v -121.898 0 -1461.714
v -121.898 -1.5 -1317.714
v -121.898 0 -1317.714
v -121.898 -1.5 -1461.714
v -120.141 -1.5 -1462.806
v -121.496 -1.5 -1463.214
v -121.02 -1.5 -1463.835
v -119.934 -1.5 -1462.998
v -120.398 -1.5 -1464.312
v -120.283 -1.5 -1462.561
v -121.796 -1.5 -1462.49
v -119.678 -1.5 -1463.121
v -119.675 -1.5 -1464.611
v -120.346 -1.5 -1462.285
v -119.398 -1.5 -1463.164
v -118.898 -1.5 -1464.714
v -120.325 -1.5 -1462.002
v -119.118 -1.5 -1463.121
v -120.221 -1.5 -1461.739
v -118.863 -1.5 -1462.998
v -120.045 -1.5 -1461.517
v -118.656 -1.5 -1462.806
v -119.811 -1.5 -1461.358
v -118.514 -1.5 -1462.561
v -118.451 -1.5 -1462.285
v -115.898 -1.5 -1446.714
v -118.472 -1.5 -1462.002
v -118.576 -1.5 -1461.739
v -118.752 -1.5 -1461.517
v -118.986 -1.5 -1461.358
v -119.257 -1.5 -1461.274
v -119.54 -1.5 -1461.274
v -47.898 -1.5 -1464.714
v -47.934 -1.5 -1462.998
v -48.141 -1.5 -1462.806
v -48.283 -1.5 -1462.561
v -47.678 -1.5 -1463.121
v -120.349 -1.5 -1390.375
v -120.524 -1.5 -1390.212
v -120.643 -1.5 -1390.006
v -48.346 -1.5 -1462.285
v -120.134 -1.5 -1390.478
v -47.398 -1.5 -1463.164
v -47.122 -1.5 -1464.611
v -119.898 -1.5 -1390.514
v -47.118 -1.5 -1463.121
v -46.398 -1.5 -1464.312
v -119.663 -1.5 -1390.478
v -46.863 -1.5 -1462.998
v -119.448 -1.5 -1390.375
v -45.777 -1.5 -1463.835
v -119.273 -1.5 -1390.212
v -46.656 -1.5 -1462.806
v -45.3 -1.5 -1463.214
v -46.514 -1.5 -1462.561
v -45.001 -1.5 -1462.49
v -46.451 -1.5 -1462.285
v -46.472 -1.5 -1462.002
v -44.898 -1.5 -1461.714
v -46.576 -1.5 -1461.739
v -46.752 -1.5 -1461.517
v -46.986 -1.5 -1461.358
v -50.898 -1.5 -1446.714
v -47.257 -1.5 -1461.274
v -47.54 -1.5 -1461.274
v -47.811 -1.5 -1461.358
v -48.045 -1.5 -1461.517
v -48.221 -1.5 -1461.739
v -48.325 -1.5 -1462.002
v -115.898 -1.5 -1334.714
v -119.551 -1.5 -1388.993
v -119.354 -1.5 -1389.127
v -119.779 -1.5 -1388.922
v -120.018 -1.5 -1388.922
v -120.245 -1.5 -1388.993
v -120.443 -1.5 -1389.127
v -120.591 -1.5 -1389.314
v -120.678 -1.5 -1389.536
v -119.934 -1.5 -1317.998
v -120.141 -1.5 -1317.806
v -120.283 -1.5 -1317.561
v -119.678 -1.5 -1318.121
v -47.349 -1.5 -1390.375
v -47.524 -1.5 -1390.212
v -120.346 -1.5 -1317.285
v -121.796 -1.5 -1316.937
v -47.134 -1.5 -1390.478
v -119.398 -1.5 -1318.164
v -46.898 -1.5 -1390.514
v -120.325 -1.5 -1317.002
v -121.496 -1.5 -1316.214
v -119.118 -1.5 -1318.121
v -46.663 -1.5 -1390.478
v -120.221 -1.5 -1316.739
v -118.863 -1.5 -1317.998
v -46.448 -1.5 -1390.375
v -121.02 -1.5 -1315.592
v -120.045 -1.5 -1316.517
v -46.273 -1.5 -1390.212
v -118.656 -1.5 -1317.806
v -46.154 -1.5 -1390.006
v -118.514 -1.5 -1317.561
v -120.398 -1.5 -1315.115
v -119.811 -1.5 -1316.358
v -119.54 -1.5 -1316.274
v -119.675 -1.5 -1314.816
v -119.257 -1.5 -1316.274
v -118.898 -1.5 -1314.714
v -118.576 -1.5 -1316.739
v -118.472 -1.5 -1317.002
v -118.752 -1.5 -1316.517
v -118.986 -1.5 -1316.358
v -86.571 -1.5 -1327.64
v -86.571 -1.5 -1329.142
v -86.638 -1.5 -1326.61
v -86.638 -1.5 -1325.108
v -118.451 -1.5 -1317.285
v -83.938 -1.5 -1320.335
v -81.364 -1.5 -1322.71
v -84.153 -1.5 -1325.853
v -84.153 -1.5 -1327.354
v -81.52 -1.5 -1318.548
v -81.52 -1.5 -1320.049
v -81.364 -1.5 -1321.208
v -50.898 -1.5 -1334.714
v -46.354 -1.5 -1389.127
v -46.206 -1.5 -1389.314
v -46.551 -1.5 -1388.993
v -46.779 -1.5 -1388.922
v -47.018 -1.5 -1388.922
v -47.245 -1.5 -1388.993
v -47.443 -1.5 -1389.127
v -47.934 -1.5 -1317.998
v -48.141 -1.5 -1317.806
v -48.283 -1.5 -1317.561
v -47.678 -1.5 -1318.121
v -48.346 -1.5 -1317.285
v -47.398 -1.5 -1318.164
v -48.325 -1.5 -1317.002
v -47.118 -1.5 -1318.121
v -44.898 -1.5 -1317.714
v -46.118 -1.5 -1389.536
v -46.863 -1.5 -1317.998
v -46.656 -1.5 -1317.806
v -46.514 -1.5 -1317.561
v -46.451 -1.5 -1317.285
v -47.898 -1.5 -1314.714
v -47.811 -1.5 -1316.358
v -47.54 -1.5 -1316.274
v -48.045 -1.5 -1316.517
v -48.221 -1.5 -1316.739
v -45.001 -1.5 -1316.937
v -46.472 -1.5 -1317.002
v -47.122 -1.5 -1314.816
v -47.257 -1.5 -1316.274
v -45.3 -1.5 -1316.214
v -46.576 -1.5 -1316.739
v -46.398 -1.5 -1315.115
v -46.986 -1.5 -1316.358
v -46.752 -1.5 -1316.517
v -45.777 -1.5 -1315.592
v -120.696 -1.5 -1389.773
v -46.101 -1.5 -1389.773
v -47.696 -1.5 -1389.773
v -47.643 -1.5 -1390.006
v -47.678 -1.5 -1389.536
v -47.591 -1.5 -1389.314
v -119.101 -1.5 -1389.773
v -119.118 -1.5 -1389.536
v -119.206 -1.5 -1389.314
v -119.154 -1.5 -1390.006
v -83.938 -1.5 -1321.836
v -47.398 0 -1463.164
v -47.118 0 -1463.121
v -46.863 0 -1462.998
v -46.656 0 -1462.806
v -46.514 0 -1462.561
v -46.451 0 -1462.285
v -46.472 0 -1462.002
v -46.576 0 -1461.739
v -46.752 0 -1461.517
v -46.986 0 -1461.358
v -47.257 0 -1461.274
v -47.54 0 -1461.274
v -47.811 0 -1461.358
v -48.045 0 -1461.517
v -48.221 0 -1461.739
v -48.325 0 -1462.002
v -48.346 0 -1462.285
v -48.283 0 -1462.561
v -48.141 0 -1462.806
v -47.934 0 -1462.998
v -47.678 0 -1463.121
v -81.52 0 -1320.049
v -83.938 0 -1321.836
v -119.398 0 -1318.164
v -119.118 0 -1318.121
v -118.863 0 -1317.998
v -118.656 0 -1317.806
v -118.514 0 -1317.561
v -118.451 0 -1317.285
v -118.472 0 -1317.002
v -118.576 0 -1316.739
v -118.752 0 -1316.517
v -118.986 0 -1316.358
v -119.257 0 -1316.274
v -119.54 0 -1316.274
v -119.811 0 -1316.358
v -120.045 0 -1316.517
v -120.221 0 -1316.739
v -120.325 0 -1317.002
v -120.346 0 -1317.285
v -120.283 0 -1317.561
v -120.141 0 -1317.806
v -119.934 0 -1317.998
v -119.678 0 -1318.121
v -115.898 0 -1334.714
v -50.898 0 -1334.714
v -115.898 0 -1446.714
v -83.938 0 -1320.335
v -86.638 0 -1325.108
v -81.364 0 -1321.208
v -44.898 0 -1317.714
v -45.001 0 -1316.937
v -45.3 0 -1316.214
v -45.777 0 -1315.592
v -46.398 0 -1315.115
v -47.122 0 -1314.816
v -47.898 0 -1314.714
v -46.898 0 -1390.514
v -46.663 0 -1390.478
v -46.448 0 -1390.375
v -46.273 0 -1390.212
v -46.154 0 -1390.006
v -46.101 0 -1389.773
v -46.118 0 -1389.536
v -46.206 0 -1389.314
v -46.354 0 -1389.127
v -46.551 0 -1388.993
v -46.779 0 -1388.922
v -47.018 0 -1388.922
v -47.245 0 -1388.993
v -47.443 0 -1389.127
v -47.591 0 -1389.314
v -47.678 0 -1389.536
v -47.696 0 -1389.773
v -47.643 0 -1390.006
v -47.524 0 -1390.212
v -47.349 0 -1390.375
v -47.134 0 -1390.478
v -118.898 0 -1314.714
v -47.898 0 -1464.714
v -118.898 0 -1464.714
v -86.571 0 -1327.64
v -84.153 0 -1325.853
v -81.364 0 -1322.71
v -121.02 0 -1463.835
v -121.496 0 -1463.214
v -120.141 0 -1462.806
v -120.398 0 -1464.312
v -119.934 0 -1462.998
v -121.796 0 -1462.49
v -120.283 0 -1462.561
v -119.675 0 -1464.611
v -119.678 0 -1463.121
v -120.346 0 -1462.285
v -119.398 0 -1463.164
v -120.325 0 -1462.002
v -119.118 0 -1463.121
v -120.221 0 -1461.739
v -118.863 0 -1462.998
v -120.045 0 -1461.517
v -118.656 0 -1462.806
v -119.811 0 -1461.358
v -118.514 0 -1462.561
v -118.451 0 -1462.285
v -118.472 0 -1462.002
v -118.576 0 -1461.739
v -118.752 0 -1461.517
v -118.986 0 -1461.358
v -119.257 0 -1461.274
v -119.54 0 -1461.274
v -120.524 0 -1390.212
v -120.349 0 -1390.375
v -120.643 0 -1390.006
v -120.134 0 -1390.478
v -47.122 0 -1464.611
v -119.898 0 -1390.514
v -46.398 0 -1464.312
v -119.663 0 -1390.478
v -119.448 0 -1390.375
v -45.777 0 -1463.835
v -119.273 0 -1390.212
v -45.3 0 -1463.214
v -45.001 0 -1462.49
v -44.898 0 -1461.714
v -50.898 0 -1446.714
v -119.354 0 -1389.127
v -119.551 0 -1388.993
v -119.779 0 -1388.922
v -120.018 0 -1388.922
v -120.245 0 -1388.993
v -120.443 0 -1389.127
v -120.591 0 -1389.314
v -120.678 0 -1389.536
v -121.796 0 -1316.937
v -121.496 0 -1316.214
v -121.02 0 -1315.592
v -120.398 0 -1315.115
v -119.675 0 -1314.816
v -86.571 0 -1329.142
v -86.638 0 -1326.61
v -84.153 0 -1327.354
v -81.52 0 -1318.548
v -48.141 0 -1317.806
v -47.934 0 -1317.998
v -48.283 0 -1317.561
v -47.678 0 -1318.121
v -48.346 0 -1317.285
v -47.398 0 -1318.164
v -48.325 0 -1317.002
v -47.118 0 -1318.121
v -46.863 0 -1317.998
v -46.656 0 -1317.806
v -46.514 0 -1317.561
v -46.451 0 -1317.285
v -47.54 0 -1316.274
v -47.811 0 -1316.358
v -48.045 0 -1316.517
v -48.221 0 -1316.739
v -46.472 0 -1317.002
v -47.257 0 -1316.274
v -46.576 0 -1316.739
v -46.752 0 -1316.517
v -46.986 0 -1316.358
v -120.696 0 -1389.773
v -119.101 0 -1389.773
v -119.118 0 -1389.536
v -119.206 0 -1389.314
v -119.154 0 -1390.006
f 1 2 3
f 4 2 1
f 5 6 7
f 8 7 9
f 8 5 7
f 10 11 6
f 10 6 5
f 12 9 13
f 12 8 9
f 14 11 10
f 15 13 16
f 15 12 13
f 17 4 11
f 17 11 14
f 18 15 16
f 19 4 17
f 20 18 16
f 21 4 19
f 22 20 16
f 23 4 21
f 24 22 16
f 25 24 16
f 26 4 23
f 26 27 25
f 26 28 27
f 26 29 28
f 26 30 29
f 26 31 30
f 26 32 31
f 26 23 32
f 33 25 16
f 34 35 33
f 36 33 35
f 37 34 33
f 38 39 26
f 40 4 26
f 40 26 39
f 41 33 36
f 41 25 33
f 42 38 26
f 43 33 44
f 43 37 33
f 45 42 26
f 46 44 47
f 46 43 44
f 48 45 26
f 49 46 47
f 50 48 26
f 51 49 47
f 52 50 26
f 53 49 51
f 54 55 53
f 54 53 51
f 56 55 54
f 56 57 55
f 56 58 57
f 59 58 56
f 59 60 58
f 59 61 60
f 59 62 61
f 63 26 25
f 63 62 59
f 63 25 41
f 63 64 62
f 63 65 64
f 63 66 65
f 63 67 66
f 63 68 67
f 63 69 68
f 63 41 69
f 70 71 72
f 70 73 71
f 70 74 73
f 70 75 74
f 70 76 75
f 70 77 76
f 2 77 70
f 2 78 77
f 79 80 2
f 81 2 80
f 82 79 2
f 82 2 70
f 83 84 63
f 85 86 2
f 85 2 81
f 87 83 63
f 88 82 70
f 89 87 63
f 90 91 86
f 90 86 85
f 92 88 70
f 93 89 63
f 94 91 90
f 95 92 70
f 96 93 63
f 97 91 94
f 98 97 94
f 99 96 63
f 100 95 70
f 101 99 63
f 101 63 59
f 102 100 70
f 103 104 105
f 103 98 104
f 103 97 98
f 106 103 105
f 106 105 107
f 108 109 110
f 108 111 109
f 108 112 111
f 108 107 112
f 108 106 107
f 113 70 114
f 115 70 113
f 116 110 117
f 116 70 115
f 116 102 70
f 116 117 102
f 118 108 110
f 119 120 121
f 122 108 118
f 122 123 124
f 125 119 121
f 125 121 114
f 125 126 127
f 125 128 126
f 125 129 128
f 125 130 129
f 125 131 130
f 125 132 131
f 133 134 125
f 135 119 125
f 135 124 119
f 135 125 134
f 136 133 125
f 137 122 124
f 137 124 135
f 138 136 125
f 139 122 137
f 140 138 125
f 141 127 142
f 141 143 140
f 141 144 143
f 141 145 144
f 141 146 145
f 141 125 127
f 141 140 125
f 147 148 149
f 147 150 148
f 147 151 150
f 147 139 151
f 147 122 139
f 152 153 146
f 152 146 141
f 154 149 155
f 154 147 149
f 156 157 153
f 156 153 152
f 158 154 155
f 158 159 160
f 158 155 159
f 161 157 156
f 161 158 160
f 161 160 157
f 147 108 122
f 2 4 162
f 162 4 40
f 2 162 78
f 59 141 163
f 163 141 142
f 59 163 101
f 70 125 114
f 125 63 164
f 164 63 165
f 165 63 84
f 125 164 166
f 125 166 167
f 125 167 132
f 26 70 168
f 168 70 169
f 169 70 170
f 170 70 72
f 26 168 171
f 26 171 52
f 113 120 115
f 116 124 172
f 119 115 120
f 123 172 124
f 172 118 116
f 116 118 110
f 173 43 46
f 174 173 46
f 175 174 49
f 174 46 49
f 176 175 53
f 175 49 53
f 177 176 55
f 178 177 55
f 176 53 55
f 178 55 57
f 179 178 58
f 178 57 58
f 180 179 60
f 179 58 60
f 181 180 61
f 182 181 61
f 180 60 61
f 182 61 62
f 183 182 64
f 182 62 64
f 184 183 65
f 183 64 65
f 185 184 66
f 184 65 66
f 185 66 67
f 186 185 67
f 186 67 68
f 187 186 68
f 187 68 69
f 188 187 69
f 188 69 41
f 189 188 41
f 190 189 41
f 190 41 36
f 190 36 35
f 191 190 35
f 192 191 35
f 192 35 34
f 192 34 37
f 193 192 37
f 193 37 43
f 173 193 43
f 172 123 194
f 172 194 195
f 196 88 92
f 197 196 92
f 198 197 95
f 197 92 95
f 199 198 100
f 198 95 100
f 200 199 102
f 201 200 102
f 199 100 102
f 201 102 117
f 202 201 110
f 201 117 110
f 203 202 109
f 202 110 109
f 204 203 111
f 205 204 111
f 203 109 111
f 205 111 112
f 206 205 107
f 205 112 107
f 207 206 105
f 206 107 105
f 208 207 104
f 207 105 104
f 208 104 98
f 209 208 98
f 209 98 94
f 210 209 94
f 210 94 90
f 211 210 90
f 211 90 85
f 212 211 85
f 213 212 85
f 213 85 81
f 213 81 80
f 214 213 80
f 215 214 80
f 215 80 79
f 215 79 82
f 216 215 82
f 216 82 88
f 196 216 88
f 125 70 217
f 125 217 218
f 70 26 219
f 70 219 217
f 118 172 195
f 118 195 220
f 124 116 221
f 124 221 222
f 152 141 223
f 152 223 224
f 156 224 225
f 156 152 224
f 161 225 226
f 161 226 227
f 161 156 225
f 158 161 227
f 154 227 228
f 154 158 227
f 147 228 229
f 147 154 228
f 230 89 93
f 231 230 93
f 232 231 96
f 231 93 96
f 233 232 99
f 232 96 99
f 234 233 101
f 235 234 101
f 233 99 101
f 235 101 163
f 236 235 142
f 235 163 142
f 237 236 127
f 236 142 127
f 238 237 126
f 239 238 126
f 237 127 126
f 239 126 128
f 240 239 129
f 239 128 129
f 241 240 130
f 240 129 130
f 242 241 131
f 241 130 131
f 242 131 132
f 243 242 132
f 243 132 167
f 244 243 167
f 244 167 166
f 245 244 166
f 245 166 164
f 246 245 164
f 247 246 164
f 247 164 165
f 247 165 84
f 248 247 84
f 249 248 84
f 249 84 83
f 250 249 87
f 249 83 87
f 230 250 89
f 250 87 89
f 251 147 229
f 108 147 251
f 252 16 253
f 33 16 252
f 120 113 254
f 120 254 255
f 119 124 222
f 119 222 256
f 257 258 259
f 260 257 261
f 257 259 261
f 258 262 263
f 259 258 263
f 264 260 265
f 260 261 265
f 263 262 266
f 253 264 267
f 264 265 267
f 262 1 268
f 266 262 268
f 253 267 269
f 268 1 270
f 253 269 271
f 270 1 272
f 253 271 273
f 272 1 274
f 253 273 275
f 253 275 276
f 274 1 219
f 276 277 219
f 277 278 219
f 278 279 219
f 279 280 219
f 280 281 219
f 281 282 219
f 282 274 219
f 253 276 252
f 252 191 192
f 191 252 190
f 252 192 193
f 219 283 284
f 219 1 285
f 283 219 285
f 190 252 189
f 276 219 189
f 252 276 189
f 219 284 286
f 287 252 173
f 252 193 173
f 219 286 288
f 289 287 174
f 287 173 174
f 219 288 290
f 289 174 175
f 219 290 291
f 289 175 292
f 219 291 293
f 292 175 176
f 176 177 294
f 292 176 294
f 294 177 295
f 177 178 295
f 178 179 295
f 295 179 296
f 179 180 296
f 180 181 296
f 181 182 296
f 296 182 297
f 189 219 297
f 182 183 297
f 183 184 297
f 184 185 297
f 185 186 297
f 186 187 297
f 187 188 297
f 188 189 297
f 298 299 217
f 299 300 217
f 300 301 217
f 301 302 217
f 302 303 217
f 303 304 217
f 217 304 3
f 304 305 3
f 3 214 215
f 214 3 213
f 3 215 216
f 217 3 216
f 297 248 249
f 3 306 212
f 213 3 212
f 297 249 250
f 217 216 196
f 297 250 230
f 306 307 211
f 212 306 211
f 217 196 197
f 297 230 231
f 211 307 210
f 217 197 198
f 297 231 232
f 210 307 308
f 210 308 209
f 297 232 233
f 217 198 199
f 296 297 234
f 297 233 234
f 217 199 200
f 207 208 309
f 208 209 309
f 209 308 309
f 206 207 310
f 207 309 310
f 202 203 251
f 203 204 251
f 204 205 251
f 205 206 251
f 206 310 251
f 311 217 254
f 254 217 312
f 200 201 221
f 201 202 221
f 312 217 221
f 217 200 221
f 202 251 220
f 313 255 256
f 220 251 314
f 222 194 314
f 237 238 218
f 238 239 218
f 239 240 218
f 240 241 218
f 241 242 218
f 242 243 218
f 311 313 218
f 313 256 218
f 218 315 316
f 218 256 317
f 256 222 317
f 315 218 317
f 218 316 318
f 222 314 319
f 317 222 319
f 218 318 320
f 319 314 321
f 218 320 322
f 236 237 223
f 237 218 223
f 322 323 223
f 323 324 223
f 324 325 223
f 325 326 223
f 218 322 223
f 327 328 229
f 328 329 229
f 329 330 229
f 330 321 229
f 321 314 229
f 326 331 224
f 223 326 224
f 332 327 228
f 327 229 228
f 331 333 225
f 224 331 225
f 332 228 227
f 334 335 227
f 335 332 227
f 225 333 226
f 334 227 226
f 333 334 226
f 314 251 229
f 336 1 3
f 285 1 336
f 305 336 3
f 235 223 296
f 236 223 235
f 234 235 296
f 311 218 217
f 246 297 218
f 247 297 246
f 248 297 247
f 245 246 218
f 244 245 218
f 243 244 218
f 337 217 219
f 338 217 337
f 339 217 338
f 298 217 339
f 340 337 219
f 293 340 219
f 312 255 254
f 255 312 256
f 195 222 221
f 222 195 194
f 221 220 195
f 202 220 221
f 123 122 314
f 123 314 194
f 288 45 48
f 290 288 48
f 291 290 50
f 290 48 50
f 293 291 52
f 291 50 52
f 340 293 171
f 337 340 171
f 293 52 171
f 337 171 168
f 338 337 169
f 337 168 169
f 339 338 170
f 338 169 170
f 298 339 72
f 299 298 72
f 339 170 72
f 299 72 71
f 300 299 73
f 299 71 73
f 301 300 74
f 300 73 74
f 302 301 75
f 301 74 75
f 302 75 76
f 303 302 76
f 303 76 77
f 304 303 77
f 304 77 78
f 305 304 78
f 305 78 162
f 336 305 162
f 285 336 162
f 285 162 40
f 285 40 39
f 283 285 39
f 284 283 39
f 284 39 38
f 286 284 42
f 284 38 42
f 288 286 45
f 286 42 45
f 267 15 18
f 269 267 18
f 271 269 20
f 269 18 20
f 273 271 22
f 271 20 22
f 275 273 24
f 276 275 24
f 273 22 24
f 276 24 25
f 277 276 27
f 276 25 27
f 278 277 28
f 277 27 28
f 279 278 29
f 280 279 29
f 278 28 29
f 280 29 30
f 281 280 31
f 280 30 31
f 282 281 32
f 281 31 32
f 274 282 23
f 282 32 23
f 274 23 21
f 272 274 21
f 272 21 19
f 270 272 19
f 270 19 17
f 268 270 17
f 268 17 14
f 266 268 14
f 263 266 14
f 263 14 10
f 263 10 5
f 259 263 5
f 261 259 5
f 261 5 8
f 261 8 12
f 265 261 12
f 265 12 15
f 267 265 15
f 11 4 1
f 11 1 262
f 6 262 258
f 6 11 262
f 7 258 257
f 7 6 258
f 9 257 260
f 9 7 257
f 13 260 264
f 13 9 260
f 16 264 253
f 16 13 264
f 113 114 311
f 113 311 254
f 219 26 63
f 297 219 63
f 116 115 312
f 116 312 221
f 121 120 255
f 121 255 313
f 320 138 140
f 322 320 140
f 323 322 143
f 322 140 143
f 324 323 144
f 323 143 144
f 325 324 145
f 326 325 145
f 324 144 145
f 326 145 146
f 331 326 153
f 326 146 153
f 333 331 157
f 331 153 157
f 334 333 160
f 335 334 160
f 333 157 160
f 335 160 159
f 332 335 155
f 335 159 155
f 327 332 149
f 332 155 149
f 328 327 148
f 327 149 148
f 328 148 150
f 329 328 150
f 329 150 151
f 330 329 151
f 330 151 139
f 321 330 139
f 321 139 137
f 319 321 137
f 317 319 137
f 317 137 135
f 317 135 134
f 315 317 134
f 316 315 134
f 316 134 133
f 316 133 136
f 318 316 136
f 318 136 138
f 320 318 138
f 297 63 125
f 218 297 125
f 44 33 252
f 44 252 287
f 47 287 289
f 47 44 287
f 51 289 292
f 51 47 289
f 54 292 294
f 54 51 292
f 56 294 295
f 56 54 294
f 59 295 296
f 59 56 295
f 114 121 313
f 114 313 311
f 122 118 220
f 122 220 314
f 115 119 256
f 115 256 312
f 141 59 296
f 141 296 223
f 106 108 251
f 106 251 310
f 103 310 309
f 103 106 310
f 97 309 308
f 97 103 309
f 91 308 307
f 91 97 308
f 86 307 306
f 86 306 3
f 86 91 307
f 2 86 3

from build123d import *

# Parameters (mm, degrees)
EXTRUDE_1_DEPTH     = 15
FILLET_1_R          = 1
EXTRUDE_START       = -2
SKETCH_2_R          = 1.5
EXTRUDE_2_DEPTH     = 2
FILLET_7_R          = 1
FILLET_2_R          = 1
FILLET_3_R          = 1
FILLET_4_R          = 1
SKETCH_3_R          = 0.95
CUT_EXTRUDE_1_DEPTH = 10
EXTRUDE_3_DEPTH     = 3
FILLET_6_R          = 1
SKETCH_5_R          = 1
CUT_EXTRUDE_2_DEPTH = 2
EXTRUDE_START_2     = 1.5
SKETCH_6_R          = 0.95
EXTRUDE_4_DEPTH     = 1.5
SKETCH_7_W          = 91.570704936
SKETCH_7_H          = 168.371941333
CUT_EXTRUDE_3_DEPTH = 15
SKETCH_8_W          = 65
SKETCH_8_H          = 116
CUT_EXTRUDE_4_DEPTH = 1.5
CUT_EXTRUDE_5_DEPTH = 1.5
SKETCH_10_W         = 65
SKETCH_10_H         = 2
EXTRUDE_5_DEPTH     = 1.5
SKETCH_11_R         = 0.8
CUT_EXTRUDE_6_DEPTH = 1.5


with BuildPart() as part:
    # 草图1 → 凸台-拉伸1 (new body)
    with BuildSketch(Plane(origin=(0.249036734, 0, -75.707167104), x_dir=(1, 0, 0), z_dir=(0, 1, 0))):
        with BuildLine():
            Line((-45.147424513, 1386.006364089), (-45.147424513, 1242.006364089))
            ThreePointArc((-45.147424513, 1242.006364089), (-46.02610417, 1239.885043746), (-48.147424513, 1239.006364089))
            Line((-48.147424513, 1239.006364089), (-119.147424513, 1239.006364089))
            ThreePointArc((-119.147424513, 1239.006364089), (-121.268744857, 1239.885043746), (-122.147424513, 1242.006364089))
            Line((-122.147424513, 1242.006364089), (-122.147424513, 1386.006364089))
            ThreePointArc((-122.147424513, 1386.006364089), (-121.268744857, 1388.127684433), (-119.147424513, 1389.006364089))
            Line((-119.147424513, 1389.006364089), (-48.147424513, 1389.006364089))
            ThreePointArc((-48.147424513, 1389.006364089), (-46.02610417, 1388.127684433), (-45.147424513, 1386.006364089))
        make_face()
        with BuildLine():
            Line((-110.647424513, 1387.506364089), (-86.803457574, 1387.506364089))
            Line((-86.803457574, 1387.506364089), (-86.803457574, 1384.506364089))
            Line((-86.803457574, 1384.506364089), (-79.369983761, 1384.506364089))
            Line((-79.369983761, 1384.506364089), (-79.369983761, 1387.506364089))
            Line((-79.369983761, 1387.506364089), (-56.647424513, 1387.506364089))
            ThreePointArc((-56.647424513, 1387.506364089), (-49.576356701, 1384.577431901), (-46.647424513, 1377.506364089))
            Line((-46.647424513, 1377.506364089), (-46.647424513, 1369.006364089))
            Line((-46.647424513, 1369.006364089), (-49.044172281, 1369.006364089))
            Line((-49.044172281, 1369.006364089), (-49.044172281, 1366.006364089))
            Line((-49.044172281, 1366.006364089), (-46.647424513, 1366.006364089))
            Line((-46.647424513, 1366.006364089), (-46.647424513, 1262.006364089))
            Line((-46.647424513, 1262.006364089), (-49.044172281, 1262.006364089))
            Line((-49.044172281, 1262.006364089), (-49.044172281, 1259.006364089))
            Line((-49.044172281, 1259.006364089), (-46.647424513, 1259.006364089))
            Line((-46.647424513, 1259.006364089), (-46.647424513, 1250.506364089))
            ThreePointArc((-46.647424513, 1250.506364089), (-49.576356701, 1243.435296277), (-56.647424513, 1240.506364089))
            Line((-56.647424513, 1240.506364089), (-80.788236334, 1240.506364089))
            Line((-80.788236334, 1240.506364089), (-80.788236334, 1243.506364089))
            Line((-80.788236334, 1243.506364089), (-86.803457574, 1243.506364089))
            Line((-86.803457574, 1243.506364089), (-86.803457574, 1240.506364089))
            Line((-86.803457574, 1240.506364089), (-110.647424513, 1240.506364089))
            ThreePointArc((-110.647424513, 1240.506364089), (-117.718492325, 1243.435296277), (-120.647424513, 1250.506364089))
            Line((-120.647424513, 1250.506364089), (-120.647424513, 1259.006364089))
            Line((-120.647424513, 1259.006364089), (-118.250676745, 1259.006364089))
            Line((-118.250676745, 1259.006364089), (-118.250676745, 1262.006364089))
            Line((-118.250676745, 1262.006364089), (-120.647424513, 1262.006364089))
            Line((-120.647424513, 1262.006364089), (-120.647424513, 1366.006364089))
            Line((-120.647424513, 1366.006364089), (-118.250676745, 1366.006364089))
            Line((-118.250676745, 1366.006364089), (-118.250676745, 1369.006364089))
            Line((-118.250676745, 1369.006364089), (-120.647424513, 1369.006364089))
            Line((-120.647424513, 1369.006364089), (-120.647424513, 1377.506364089))
            ThreePointArc((-120.647424513, 1377.506364089), (-117.718492325, 1384.577431901), (-110.647424513, 1387.506364089))
        make_face(mode=Mode.SUBTRACT)
    extrude(amount=EXTRUDE_1_DEPTH)

    # 圆角1
    fillet_1_edges = [part.edges().sort_by_distance(p)[0] for p in [
        (-48.795135547, 7.5, -1334.713531194),
        (-48.795135547, 7.5, -1337.713531194),
        (-48.795135547, 7.5, -1441.713531194),
        (-48.795135547, 7.5, -1444.713531194),
        (-79.120947027, 7.5, -1460.213531194),
        (-86.55442084, 7.5, -1460.213531194),
        (-118.001640012, 7.5, -1444.713531194),
        (-118.001640012, 7.5, -1441.713531194),
        (-118.001640012, 7.5, -1337.713531194),
        (-118.001640012, 7.5, -1334.713531194),
        (-86.55442084, 7.5, -1319.213531194),
        (-80.5391996, 7.5, -1319.213531194),
    ]]
    fillet(fillet_1_edges, radius=FILLET_1_R)

    # 草图2 → 凸台-拉伸2 (add)
    with BuildSketch(Plane(origin=(0.249036734, 15, -75.707167104), x_dir=(1, 0, 0), z_dir=(0, 1, 0)).offset(EXTRUDE_START)):
        with BuildLine():
            Line((-45.147424513, 1242.006364089), (-45.147424513, 1386.006364089))
            ThreePointArc((-45.147424513, 1386.006364089), (-46.02610417, 1388.127684433), (-48.147424513, 1389.006364089))
            Line((-48.147424513, 1389.006364089), (-119.147424513, 1389.006364089))
            ThreePointArc((-119.147424513, 1389.006364089), (-121.268744857, 1388.127684433), (-122.147424513, 1386.006364089))
            Line((-122.147424513, 1386.006364089), (-122.147424513, 1242.006364089))
            ThreePointArc((-122.147424513, 1242.006364089), (-121.268744857, 1239.885043746), (-119.147424513, 1239.006364089))
            Line((-119.147424513, 1239.006364089), (-48.147424513, 1239.006364089))
            ThreePointArc((-48.147424513, 1239.006364089), (-46.02610417, 1239.885043746), (-45.147424513, 1242.006364089))
        make_face()
        with Locations(Location((-84.647424513, 1378.506364089, 0), (0, 0, 270))):
            Circle(SKETCH_2_R, mode=Mode.SUBTRACT)
        with Locations(Location((-84.647424513, 1328.506364089, 0), (0, 0, 270))):
            Circle(SKETCH_2_R, mode=Mode.SUBTRACT)
        with BuildLine():
            Line((-65.147424513, 1308.756575121), (-65.147424513, 1318.506364089))
            ThreePointArc((-65.147424513, 1318.506364089), (-65.440317732, 1319.21347087), (-66.147424513, 1319.506364089))
            Line((-66.147424513, 1319.506364089), (-92.147424513, 1319.506364089))
            ThreePointArc((-92.147424513, 1319.506364089), (-92.854531294, 1319.21347087), (-93.147424513, 1318.506364089))
            Line((-93.147424513, 1318.506364089), (-93.147424513, 1313.006364089))
            ThreePointArc((-93.147424513, 1313.006364089), (-93.440317732, 1312.299257308), (-94.147424513, 1312.006364089))
            Line((-94.147424513, 1312.006364089), (-95.147424513, 1312.006364089))
            ThreePointArc((-95.147424513, 1312.006364089), (-95.854531294, 1311.71347087), (-96.147424513, 1311.006364089))
            Line((-96.147424513, 1311.006364089), (-96.147424513, 1305.006364089))
            ThreePointArc((-96.147424513, 1305.006364089), (-95.854531294, 1304.299257308), (-95.147424513, 1304.006364089))
            Line((-95.147424513, 1304.006364089), (-86.147424513, 1304.006364089))
            ThreePointArc((-86.147424513, 1304.006364089), (-85.440317732, 1303.71347087), (-85.147424513, 1303.006364089))
            Line((-85.147424513, 1303.006364089), (-85.147424513, 1274.006364089))
            ThreePointArc((-85.147424513, 1274.006364089), (-84.854531294, 1273.299257308), (-84.147424513, 1273.006364089))
            Line((-84.147424513, 1273.006364089), (-65.147424513, 1273.006364089))
            Line((-65.147424513, 1273.006364089), (-64.147424513, 1273.006364089))
            Line((-64.147424513, 1273.006364089), (-64.147424513, 1269.756575121))
            ThreePointArc((-64.147424513, 1269.756575121), (-63.854531294, 1269.04946834), (-63.147424513, 1268.756575121))
            Line((-63.147424513, 1268.756575121), (-56.817685319, 1268.756575121))
            ThreePointArc((-56.817685319, 1268.756575121), (-56.110578538, 1269.04946834), (-55.817685319, 1269.756575121))
            Line((-55.817685319, 1269.756575121), (-55.817685319, 1308.756575121))
            Line((-55.817685319, 1308.756575121), (-65.147424513, 1308.756575121))
        make_face(mode=Mode.SUBTRACT)
        with BuildLine():
            Line((-89.147424513, 1277.506364089), (-99.147424513, 1277.506364089))
            ThreePointArc((-99.147424513, 1277.506364089), (-99.854531294, 1277.799257308), (-100.147424513, 1278.506364089))
            Line((-100.147424513, 1278.506364089), (-100.147424513, 1283.506364089))
            ThreePointArc((-100.147424513, 1283.506364089), (-99.854531294, 1284.21347087), (-99.147424513, 1284.506364089))
            Line((-99.147424513, 1284.506364089), (-89.147424513, 1284.506364089))
            ThreePointArc((-89.147424513, 1284.506364089), (-88.440317732, 1284.21347087), (-88.147424513, 1283.506364089))
            Line((-88.147424513, 1283.506364089), (-88.147424513, 1278.506364089))
            ThreePointArc((-88.147424513, 1278.506364089), (-88.440317732, 1277.799257308), (-89.147424513, 1277.506364089))
        make_face(mode=Mode.SUBTRACT)
        with BuildLine():
            Line((-104.147424513, 1374.006364089), (-65.147424513, 1374.006364089))
            ThreePointArc((-65.147424513, 1374.006364089), (-64.440317732, 1373.71347087), (-64.147424513, 1373.006364089))
            Line((-64.147424513, 1373.006364089), (-64.147424513, 1334.006364089))
            ThreePointArc((-64.147424513, 1334.006364089), (-64.440317732, 1333.299257308), (-65.147424513, 1333.006364089))
            Line((-65.147424513, 1333.006364089), (-104.147424513, 1333.006364089))
            ThreePointArc((-104.147424513, 1333.006364089), (-104.854531294, 1333.299257308), (-105.147424513, 1334.006364089))
            Line((-105.147424513, 1334.006364089), (-105.147424513, 1373.006364089))
            ThreePointArc((-105.147424513, 1373.006364089), (-104.854531294, 1373.71347087), (-104.147424513, 1374.006364089))
        make_face(mode=Mode.SUBTRACT)
    extrude(amount=EXTRUDE_2_DEPTH)

    # 圆角7
    fillet_7_edges = [part.edges().sort_by_distance(p)[0] for p in [
        (-63.898387779, 14, -1348.713531194),
        (-64.898387779, 14, -1384.463742225),
        (-55.568648585, 14, -1384.463742225),
    ]]
    fillet(fillet_7_edges, radius=FILLET_7_R)

    # 圆角2
    fillet_2_edges = [part.edges().sort_by_distance(p)[0] for p in [
        (-78.898387779, 15, -1395.213531194),
        (-92.60549456, 15, -1394.920637975),
        (-92.898387779, 15, -1391.463531194),
        (-93.191280998, 15, -1388.006424412),
        (-94.398387779, 15, -1387.713531194),
        (-95.60549456, 15, -1387.420637975),
        (-95.898387779, 15, -1383.713531194),
        (-95.60549456, 15, -1380.006424412),
        (-90.398387779, 15, -1379.713531194),
        (-85.191280998, 15, -1379.420637975),
        (-84.898387779, 15, -1364.213531194),
        (-84.60549456, 15, -1349.006424412),
        (-74.398387779, 15, -1348.713531194),
        (-64.898387779, 15, -1389.838636709),
        (-65.191280998, 15, -1394.920637975),
        (-93.898387779, 15, -1360.213531194),
        (-99.60549456, 15, -1359.920637975),
        (-99.898387779, 15, -1356.713531194),
        (-99.60549456, 15, -1353.506424412),
        (-93.898387779, 15, -1353.213531194),
        (-88.191280998, 15, -1353.506424412),
        (-87.898387779, 15, -1356.713531194),
        (-88.191280998, 15, -1359.920637975),
        (-83.398387779, 15, -1314.713531194),
        (-121.019708123, 15, -1315.59221085),
        (-121.898387779, 15, -1389.713531194),
        (-121.019708123, 15, -1463.834851537),
        (-83.398387779, 15, -1464.713531194),
        (-45.777067436, 15, -1463.834851537),
        (-44.898387779, 15, -1389.713531194),
        (-45.777067436, 15, -1315.59221085),
        (-63.898387779, 15, -1429.213531194),
        (-64.191280998, 15, -1449.420637975),
        (-84.398387779, 15, -1449.713531194),
        (-104.60549456, 15, -1449.420637975),
        (-104.898387779, 15, -1429.213531194),
        (-104.60549456, 15, -1409.006424412),
        (-84.398387779, 15, -1408.713531194),
        (-64.191280998, 15, -1409.006424412),
        (-84.398387779, 15, -1455.713531194),
        (-84.398387779, 15, -1405.713531194),
        (-59.733518182, 15, -1344.463742225),
        (-55.861541804, 15, -1344.756635444),
        (-55.568648585, 15, -1364.463742225),
        (-60.233518182, 15, -1384.463742225),
        (-63.898387779, 15, -1346.588636709),
        (-63.60549456, 15, -1344.756635444),
        (-55.861541804, 15, -1384.170849006),
        (-64.60549456, 15, -1384.756635444),
        (-64.191280998, 15, -1348.420637975),
    ]]
    fillet(fillet_2_edges, radius=FILLET_2_R)

    # 圆角3
    fillet_3_edges = [part.edges().sort_by_distance(p)[0] for p in [
        (-48.795135547, 0, -1336.213531194),
        (-47.096761663, 0, -1337.713531194),
        (-48.795135547, 0, -1443.213531194),
        (-47.096761663, 0, -1444.713531194),
        (-82.837683934, 0, -1460.213531194),
        (-86.55442084, 0, -1462.213531194),
        (-118.001640012, 0, -1443.213531194),
        (-119.700013895, 0, -1441.713531194),
        (-118.001640012, 0, -1336.213531194),
        (-119.700013895, 0, -1334.713531194),
        (-118.29453323, 0, -1444.420637975),
        (-118.29453323, 0, -1442.006424412),
        (-48.502242328, 0, -1444.420637975),
        (-48.502242328, 0, -1442.006424412),
        (-48.502242328, 0, -1337.420637975),
        (-48.502242328, 0, -1335.006424412),
        (-118.29453323, 0, -1337.420637975),
        (-118.29453323, 0, -1335.006424412),
        (-86.261527622, 0, -1460.506424412),
        (-79.413840246, 0, -1460.506424412),
        (-47.096761663, 0, -1334.713531194),
        (-47.096761663, 0, -1441.713531194),
        (-79.120947027, 0, -1462.213531194),
        (-119.700013895, 0, -1444.713531194),
        (-119.700013895, 0, -1337.713531194),
    ]]
    fillet(fillet_3_edges, radius=FILLET_3_R)

    # 圆角4
    fillet_4_edges = [part.edges().sort_by_distance(p)[0] for p in [
        (-74.398387779, 13, -1348.713531194),
        (-84.60549456, 13, -1349.006424412),
        (-84.898387779, 13, -1364.213531194),
        (-85.191280998, 13, -1379.420637975),
        (-90.398387779, 13, -1379.713531194),
        (-95.60549456, 13, -1380.006424412),
        (-95.898387779, 13, -1383.713531194),
        (-95.60549456, 13, -1387.420637975),
        (-94.398387779, 13, -1387.713531194),
        (-93.191280998, 13, -1388.006424412),
        (-92.898387779, 13, -1391.463531194),
        (-92.60549456, 13, -1394.920637975),
        (-78.898387779, 13, -1395.213531194),
        (-65.191280998, 13, -1394.920637975),
        (-64.898387779, 13, -1389.838636709),
        (-88.191280998, 13, -1353.506424412),
        (-93.898387779, 13, -1353.213531194),
        (-99.60549456, 13, -1353.506424412),
        (-99.898387779, 13, -1356.713531194),
        (-99.60549456, 13, -1359.920637975),
        (-93.898387779, 13, -1360.213531194),
        (-88.191280998, 13, -1359.920637975),
        (-87.898387779, 13, -1356.713531194),
        (-86.261527622, 13, -1318.920637975),
        (-83.54681022, 13, -1319.213531194),
        (-80.832092819, 13, -1318.920637975),
        (-80.5391996, 13, -1317.213531194),
        (-68.46879369, 13, -1316.213531194),
        (-49.327319967, 13, -1319.142463382),
        (-46.398387779, 13, -1330.463531194),
        (-47.096761663, 13, -1334.713531194),
        (-48.502242328, 13, -1335.006424412),
        (-48.795135547, 13, -1336.213531194),
        (-48.502242328, 13, -1337.420637975),
        (-47.096761663, 13, -1337.713531194),
        (-46.398387779, 13, -1389.713531194),
        (-47.096761663, 13, -1441.713531194),
        (-48.502242328, 13, -1442.006424412),
        (-48.795135547, 13, -1443.213531194),
        (-48.502242328, 13, -1444.420637975),
        (-47.096761663, 13, -1444.713531194),
        (-46.398387779, 13, -1448.963531194),
        (-49.327319967, 13, -1460.284599005),
        (-67.759667403, 13, -1463.213531194),
        (-79.120947027, 13, -1462.213531194),
        (-79.413840246, 13, -1460.506424412),
        (-82.837683934, 13, -1460.213531194),
        (-86.261527622, 13, -1460.506424412),
        (-86.55442084, 13, -1462.213531194),
        (-98.47640431, 13, -1463.213531194),
        (-117.469455591, 13, -1460.284599005),
        (-120.398387779, 13, -1448.963531194),
        (-119.700013895, 13, -1444.713531194),
        (-118.29453323, 13, -1444.420637975),
        (-118.001640012, 13, -1443.213531194),
        (-118.29453323, 13, -1442.006424412),
        (-119.700013895, 13, -1441.713531194),
        (-120.398387779, 13, -1389.713531194),
        (-119.700013895, 13, -1337.713531194),
        (-118.29453323, 13, -1337.420637975),
        (-118.001640012, 13, -1336.213531194),
        (-118.29453323, 13, -1335.006424412),
        (-119.700013895, 13, -1334.713531194),
        (-120.398387779, 13, -1330.463531194),
        (-117.469455591, 13, -1319.142463382),
        (-98.47640431, 13, -1316.213531194),
        (-86.55442084, 13, -1317.213531194),
        (-104.60549456, 13, -1409.006424412),
        (-104.898387779, 13, -1429.213531194),
        (-104.60549456, 13, -1449.420637975),
        (-84.398387779, 13, -1449.713531194),
        (-64.191280998, 13, -1449.420637975),
        (-63.898387779, 13, -1429.213531194),
        (-64.191280998, 13, -1409.006424412),
        (-84.398387779, 13, -1408.713531194),
        (-84.398387779, 13, -1455.713531194),
        (-84.398387779, 13, -1405.713531194),
        (-60.233518182, 13, -1384.463742225),
        (-55.568648585, 13, -1364.463742225),
        (-55.861541804, 13, -1344.756635444),
        (-59.733518182, 13, -1344.463742225),
        (-63.60549456, 13, -1344.756635444),
        (-63.898387779, 13, -1346.588636709),
        (-64.60549456, 13, -1384.756635444),
        (-55.861541804, 13, -1384.170849006),
        (-64.191280998, 13, -1348.420637975),
    ]]
    fillet(fillet_4_edges, radius=FILLET_4_R - 0.0001)  # a hair under: the kernel refuses the full size

    # 草图3 → 切除-拉伸1 (cut)
    with BuildSketch(Plane(origin=(0.249036734, 0, -75.707167104), x_dir=(1, 0, 0), z_dir=(0, -1, 0))):
        with Locations(Location((-47.647424513, -1241.506364089, 0), (0, 0, 270))):
            Circle(SKETCH_3_R)
        with Locations(Location((-47.647424513, -1386.506364089, 0), (0, 0, 90))):
            Circle(SKETCH_3_R)
        with Locations(Location((-119.647424513, -1386.506364089, 0), (0, 0, 270))):
            Circle(SKETCH_3_R)
        with Locations(Location((-119.647424513, -1241.506364089, 0), (0, 0, 90))):
            Circle(SKETCH_3_R)
    extrude(amount=-CUT_EXTRUDE_1_DEPTH, mode=Mode.SUBTRACT)

    # 草图4 → 凸台-拉伸3 (add)
    with BuildSketch(Plane(origin=(0.249036734, 13, -75.707167104), x_dir=(1, 0, 0), z_dir=(0, -1, 0))):
        with BuildLine():
            Line((-92.147424513, -1320.506364089), (-66.038217179, -1320.506364089))
            Line((-66.038217179, -1320.506364089), (-66.038217179, -1323.506364089))
            ThreePointArc((-66.038217179, -1323.506364089), (-66.331110398, -1324.21347087), (-67.038217179, -1324.506364089))
            Line((-67.038217179, -1324.506364089), (-91.147424513, -1324.506364089))
            ThreePointArc((-91.147424513, -1324.506364089), (-91.854531294, -1324.21347087), (-92.147424513, -1323.506364089))
            Line((-92.147424513, -1323.506364089), (-92.147424513, -1320.506364089))
        make_face()
    extrude(amount=EXTRUDE_3_DEPTH)

    # 圆角6
    fillet_6_edges = [part.edges().sort_by_distance(p)[0] for p in [
        (-91.898387779, 10, -1397.713531194),
        (-91.60549456, 10, -1399.920637975),
        (-78.843784112, 10, -1400.213531194),
        (-66.082073664, 10, -1399.920637975),
        (-65.789180445, 10, -1397.713531194),
        (-78.843784112, 10, -1396.213531194),
    ]]
    fillet(fillet_6_edges, radius=FILLET_6_R)

    # 草图5 → 切除-拉伸2 (cut)
    with BuildSketch(Plane(origin=(0.249036734, 15, -75.707167104), x_dir=(1, 0, 0), z_dir=(0, 1, 0))):
        with Locations(Location((-58.147424513, 1320.006364089, 0), (0, 0, 270))):
            Circle(SKETCH_5_R)
        with Locations(Location((-53.147424513, 1307.506364089, 0), (0, 0, 270))):
            Circle(SKETCH_5_R)
        with Locations(Location((-53.147424513, 1332.506364089, 0), (0, 0, 270))):
            Circle(SKETCH_5_R)
        with Locations(Location((-114.147424513, 1332.506364089, 0), (0, 0, 270))):
            Circle(SKETCH_5_R)
        with Locations(Location((-114.147424513, 1307.506364089, 0), (0, 0, 270))):
            Circle(SKETCH_5_R)
        with Locations(Location((-109.147424513, 1320.006364089, 0), (0, 0, 270))):
            Circle(SKETCH_5_R)
    extrude(amount=-CUT_EXTRUDE_2_DEPTH, mode=Mode.SUBTRACT)

    # 草图6 → 凸台-拉伸4 (add)
    with BuildSketch(Plane.XZ.offset(EXTRUDE_START_2)):
        with BuildLine():
            Line((-47.898387779, -1314.713531194), (-118.898387779, -1314.713531194))
            ThreePointArc((-118.898387779, -1314.713531194), (-121.019708123, -1315.59221085), (-121.898387779, -1317.713531194))
            Line((-121.898387779, -1317.713531194), (-121.898387779, -1461.713531194))
            ThreePointArc((-121.898387779, -1461.713531194), (-121.019708123, -1463.834851537), (-118.898387779, -1464.713531194))
            Line((-118.898387779, -1464.713531194), (-47.898387779, -1464.713531194))
            ThreePointArc((-47.898387779, -1464.713531194), (-45.777067436, -1463.834851537), (-44.898387779, -1461.713531194))
            Line((-44.898387779, -1461.713531194), (-44.898387779, -1317.713531194))
            ThreePointArc((-44.898387779, -1317.713531194), (-45.777067436, -1315.59221085), (-47.898387779, -1314.713531194))
        make_face()
        with Locations(Location((-119.398387779, -1462.213531194, 0), (0, 0, 270))):
            Circle(SKETCH_6_R, mode=Mode.SUBTRACT)
        with Locations(Location((-119.398387779, -1317.213531194, 0), (0, 0, 270))):
            Circle(SKETCH_6_R, mode=Mode.SUBTRACT)
        with Locations(Location((-47.398387779, -1462.213531194, 0), (0, 0, 270))):
            Circle(SKETCH_6_R, mode=Mode.SUBTRACT)
        with Locations(Location((-47.398387779, -1317.213531194, 0), (0, 0, 270))):
            Circle(SKETCH_6_R, mode=Mode.SUBTRACT)
    extrude(amount=-EXTRUDE_4_DEPTH)

    # 草图7 → 切除-拉伸3 (cut)
    with BuildSketch(Plane(origin=(0, 15, 0), x_dir=(1, 0, 0), z_dir=(0, 1, 0))):
        with Locations((-86.571088428, 1387.361356575)):
            Rectangle(SKETCH_7_W, SKETCH_7_H)
    extrude(amount=-CUT_EXTRUDE_3_DEPTH, mode=Mode.SUBTRACT)

    # 草图8 → 切除-拉伸4 (cut)
    with BuildSketch(Plane.XZ.offset(1.5)):
        with Locations((-83.398387779, -1390.713531194)):
            Rectangle(SKETCH_8_W, SKETCH_8_H)
    extrude(amount=-CUT_EXTRUDE_4_DEPTH, mode=Mode.SUBTRACT)

    # 草图9 → 切除-拉伸5 (cut)
    with BuildSketch(Plane.XZ.offset(1.5)):
        Polygon((-81.363761094, -1321.208175621), (-81.363761094, -1322.709507196), (-86.637910806, -1326.609548937), (-86.637910806, -1325.108217362), align=None)
        Polygon((-81.52044595, -1318.547509884), (-81.52044595, -1320.048841458), (-83.937884263, -1321.836449099), (-83.937884263, -1320.335117525), align=None)
        Polygon((-84.153251374, -1325.852632827), (-84.153251374, -1327.353964401), (-86.570689687, -1329.141572042), (-86.570689687, -1327.640240468), align=None)
    extrude(amount=-CUT_EXTRUDE_5_DEPTH, mode=Mode.SUBTRACT)

    # 草图10 → 凸台-拉伸5 (add)
    with BuildSketch(Plane.XZ.offset(1.5)):
        with Locations((-83.398387779, -1333.713531194)):
            Rectangle(SKETCH_10_W, SKETCH_10_H)
        with Locations((-83.398387779, -1447.713531194)):
            Rectangle(SKETCH_10_W, SKETCH_10_H)
    extrude(amount=-EXTRUDE_5_DEPTH)

    # 草图11 → 切除-拉伸6 (cut)
    with BuildSketch(Plane.XZ.offset(1.5)):
        with Locations(Location((-46.898387779, -1389.713531194, 0), (0, 0, 270))):
            Circle(SKETCH_11_R)
        with Locations(Location((-119.898387779, -1389.713531194, 0), (0, 0, 270))):
            Circle(SKETCH_11_R)
    extrude(amount=-CUT_EXTRUDE_6_DEPTH, mode=Mode.SUBTRACT)


solid = part.part
